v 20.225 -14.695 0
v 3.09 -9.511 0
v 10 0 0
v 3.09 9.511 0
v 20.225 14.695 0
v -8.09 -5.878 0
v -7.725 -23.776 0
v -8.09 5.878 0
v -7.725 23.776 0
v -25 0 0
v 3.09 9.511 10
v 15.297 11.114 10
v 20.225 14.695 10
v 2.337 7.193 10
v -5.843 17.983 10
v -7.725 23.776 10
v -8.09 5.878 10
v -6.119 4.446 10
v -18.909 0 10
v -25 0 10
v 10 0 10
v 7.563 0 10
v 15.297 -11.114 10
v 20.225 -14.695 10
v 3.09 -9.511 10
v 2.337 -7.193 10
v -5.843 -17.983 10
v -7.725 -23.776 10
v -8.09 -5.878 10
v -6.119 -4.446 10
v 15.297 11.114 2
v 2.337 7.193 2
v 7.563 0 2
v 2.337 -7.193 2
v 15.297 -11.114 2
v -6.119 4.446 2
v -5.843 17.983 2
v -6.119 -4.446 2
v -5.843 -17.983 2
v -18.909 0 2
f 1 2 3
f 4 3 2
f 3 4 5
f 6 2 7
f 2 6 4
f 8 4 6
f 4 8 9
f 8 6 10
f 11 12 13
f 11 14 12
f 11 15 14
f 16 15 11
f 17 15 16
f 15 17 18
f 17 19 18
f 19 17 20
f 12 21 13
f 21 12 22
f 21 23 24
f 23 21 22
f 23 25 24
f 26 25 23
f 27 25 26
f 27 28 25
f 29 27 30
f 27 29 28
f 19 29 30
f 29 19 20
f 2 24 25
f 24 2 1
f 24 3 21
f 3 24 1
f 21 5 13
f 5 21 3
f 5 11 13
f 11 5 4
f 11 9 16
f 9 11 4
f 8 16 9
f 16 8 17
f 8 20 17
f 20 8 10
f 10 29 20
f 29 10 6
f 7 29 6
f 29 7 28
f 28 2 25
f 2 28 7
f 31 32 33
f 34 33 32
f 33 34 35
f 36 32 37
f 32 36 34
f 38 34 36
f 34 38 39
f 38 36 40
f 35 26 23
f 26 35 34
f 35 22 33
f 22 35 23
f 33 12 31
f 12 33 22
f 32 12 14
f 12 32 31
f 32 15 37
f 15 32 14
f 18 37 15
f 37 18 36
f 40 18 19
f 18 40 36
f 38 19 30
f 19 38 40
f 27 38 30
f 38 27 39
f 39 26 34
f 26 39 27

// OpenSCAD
// outer points radius
outer_radius = 25;
// inner points radius
inner_radius = 10;
// number of spikes
spikes       = 5;
// heigth
height       = 10;
// wall width (width == 0: solid)
width        = 2;
// top is wider/narrower than bottom
scale        = 1;


module starBox(ro = 1, ri = 2, n = 5, h = 1, w = 0.2, s = 1)
{
  // create 2d vector shape: star
  poly = [for(i=[0:(2*n-1)])
      (i%2==0)?
        [ri*cos(180*i/n),ri*sin(180*i/n)]:
        [ro*cos(180*i/n),ro*sin(180*i/n)]
      ];

  difference()
  {
    linear_extrude(h, scale=s)
      polygon(points=poly) ;
    if ((w > 0) && (s != 0))
      translate([0,0,w])
        linear_extrude(h-w*0.999, scale=s)
        offset(delta=-w)
        polygon(points=poly) ;
    }
}


starBox(ro = outer_radius,
        ri = inner_radius,
        n  = spikes,
        h  = height,
        w  = width,
        s  = scale) ;
